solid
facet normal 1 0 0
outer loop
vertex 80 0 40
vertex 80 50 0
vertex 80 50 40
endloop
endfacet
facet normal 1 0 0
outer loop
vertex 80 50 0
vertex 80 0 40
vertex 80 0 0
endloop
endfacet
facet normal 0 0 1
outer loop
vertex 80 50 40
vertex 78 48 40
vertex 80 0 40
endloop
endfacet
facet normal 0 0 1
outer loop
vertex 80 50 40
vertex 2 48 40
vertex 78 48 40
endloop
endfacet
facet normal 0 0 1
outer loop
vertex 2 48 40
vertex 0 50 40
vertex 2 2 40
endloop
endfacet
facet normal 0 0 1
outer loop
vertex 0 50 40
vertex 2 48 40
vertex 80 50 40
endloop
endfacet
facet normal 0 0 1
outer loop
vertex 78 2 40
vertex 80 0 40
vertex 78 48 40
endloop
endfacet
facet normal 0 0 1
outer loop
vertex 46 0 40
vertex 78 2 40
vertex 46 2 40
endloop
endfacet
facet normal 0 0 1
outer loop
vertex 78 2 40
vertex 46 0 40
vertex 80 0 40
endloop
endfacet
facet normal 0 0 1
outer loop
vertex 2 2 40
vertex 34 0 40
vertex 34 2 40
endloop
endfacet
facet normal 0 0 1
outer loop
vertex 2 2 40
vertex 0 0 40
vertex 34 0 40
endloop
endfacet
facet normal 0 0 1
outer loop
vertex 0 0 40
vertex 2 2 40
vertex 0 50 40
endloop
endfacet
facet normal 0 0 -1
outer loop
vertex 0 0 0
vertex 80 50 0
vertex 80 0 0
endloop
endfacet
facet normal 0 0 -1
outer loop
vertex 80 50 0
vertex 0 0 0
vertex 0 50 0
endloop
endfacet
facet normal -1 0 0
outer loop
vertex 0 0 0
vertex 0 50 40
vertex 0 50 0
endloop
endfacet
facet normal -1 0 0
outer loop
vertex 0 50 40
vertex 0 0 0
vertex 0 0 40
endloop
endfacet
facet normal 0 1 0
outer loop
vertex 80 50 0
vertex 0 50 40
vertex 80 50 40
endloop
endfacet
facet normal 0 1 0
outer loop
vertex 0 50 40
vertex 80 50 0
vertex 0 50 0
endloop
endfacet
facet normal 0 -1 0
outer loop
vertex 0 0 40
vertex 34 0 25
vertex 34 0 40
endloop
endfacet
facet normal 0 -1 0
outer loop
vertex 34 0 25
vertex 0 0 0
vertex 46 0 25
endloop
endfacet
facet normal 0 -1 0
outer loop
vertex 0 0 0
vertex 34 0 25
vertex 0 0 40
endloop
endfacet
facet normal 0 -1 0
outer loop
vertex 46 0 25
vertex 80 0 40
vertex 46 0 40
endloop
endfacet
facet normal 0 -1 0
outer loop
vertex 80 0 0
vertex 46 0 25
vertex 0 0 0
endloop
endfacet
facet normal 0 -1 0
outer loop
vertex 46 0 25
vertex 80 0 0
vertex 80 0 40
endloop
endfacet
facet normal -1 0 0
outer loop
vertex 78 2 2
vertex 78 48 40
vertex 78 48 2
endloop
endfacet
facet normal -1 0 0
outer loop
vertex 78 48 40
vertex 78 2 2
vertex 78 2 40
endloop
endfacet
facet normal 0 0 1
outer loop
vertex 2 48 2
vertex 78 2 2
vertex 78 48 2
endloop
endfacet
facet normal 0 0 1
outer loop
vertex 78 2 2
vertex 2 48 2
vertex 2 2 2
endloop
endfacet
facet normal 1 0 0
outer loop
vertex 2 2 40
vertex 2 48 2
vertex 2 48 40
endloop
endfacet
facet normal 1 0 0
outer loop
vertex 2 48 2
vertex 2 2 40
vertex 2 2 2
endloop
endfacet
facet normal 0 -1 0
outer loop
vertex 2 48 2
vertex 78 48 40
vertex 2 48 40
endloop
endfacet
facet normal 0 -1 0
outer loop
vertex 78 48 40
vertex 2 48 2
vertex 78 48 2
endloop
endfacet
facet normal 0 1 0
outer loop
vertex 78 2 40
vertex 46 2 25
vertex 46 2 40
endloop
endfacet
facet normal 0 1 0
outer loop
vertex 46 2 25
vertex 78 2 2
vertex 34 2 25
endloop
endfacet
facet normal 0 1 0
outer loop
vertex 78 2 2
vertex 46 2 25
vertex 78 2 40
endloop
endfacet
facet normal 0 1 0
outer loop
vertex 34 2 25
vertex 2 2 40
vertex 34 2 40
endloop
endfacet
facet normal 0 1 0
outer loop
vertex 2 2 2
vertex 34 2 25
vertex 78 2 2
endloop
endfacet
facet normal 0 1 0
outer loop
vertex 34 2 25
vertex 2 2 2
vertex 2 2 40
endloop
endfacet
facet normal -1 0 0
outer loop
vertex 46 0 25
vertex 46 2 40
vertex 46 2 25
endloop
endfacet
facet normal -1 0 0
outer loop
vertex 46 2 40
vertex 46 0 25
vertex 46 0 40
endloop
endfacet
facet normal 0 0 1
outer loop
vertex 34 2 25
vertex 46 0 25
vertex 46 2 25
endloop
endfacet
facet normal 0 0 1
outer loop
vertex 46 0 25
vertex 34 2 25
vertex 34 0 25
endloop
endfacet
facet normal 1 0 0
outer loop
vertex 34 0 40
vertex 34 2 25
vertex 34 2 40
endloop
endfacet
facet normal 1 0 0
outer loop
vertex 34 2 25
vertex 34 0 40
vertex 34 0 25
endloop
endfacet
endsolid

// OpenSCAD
$fn = 32;

// ----------------------------------------------------------------------
// Enclosure box: notch enclosure
// ----------------------------------------------------------------------

// --- parameters (mm) ---
box_l = 80;               // outer length, X
box_w = 50;               // outer width, Y
box_h = 40;               // outer height
wall_t = 2;               // wall thickness
notch_w = 12;             // cable notch width
notch_h = 15;             // cable notch height

inner_h = box_h - wall_t;  // cavity depth
boss_h = inner_h - 2;  // corner boss height

difference() {
  cube([box_l, box_w, box_h]);
  translate([wall_t, wall_t, wall_t])
    cube([box_l - 2 * wall_t, box_w - 2 * wall_t, box_h]);
  translate([box_l / 2 - notch_w / 2, -1, box_h - notch_h])
    cube([notch_w, wall_t + 2, notch_h + 1]);
}
